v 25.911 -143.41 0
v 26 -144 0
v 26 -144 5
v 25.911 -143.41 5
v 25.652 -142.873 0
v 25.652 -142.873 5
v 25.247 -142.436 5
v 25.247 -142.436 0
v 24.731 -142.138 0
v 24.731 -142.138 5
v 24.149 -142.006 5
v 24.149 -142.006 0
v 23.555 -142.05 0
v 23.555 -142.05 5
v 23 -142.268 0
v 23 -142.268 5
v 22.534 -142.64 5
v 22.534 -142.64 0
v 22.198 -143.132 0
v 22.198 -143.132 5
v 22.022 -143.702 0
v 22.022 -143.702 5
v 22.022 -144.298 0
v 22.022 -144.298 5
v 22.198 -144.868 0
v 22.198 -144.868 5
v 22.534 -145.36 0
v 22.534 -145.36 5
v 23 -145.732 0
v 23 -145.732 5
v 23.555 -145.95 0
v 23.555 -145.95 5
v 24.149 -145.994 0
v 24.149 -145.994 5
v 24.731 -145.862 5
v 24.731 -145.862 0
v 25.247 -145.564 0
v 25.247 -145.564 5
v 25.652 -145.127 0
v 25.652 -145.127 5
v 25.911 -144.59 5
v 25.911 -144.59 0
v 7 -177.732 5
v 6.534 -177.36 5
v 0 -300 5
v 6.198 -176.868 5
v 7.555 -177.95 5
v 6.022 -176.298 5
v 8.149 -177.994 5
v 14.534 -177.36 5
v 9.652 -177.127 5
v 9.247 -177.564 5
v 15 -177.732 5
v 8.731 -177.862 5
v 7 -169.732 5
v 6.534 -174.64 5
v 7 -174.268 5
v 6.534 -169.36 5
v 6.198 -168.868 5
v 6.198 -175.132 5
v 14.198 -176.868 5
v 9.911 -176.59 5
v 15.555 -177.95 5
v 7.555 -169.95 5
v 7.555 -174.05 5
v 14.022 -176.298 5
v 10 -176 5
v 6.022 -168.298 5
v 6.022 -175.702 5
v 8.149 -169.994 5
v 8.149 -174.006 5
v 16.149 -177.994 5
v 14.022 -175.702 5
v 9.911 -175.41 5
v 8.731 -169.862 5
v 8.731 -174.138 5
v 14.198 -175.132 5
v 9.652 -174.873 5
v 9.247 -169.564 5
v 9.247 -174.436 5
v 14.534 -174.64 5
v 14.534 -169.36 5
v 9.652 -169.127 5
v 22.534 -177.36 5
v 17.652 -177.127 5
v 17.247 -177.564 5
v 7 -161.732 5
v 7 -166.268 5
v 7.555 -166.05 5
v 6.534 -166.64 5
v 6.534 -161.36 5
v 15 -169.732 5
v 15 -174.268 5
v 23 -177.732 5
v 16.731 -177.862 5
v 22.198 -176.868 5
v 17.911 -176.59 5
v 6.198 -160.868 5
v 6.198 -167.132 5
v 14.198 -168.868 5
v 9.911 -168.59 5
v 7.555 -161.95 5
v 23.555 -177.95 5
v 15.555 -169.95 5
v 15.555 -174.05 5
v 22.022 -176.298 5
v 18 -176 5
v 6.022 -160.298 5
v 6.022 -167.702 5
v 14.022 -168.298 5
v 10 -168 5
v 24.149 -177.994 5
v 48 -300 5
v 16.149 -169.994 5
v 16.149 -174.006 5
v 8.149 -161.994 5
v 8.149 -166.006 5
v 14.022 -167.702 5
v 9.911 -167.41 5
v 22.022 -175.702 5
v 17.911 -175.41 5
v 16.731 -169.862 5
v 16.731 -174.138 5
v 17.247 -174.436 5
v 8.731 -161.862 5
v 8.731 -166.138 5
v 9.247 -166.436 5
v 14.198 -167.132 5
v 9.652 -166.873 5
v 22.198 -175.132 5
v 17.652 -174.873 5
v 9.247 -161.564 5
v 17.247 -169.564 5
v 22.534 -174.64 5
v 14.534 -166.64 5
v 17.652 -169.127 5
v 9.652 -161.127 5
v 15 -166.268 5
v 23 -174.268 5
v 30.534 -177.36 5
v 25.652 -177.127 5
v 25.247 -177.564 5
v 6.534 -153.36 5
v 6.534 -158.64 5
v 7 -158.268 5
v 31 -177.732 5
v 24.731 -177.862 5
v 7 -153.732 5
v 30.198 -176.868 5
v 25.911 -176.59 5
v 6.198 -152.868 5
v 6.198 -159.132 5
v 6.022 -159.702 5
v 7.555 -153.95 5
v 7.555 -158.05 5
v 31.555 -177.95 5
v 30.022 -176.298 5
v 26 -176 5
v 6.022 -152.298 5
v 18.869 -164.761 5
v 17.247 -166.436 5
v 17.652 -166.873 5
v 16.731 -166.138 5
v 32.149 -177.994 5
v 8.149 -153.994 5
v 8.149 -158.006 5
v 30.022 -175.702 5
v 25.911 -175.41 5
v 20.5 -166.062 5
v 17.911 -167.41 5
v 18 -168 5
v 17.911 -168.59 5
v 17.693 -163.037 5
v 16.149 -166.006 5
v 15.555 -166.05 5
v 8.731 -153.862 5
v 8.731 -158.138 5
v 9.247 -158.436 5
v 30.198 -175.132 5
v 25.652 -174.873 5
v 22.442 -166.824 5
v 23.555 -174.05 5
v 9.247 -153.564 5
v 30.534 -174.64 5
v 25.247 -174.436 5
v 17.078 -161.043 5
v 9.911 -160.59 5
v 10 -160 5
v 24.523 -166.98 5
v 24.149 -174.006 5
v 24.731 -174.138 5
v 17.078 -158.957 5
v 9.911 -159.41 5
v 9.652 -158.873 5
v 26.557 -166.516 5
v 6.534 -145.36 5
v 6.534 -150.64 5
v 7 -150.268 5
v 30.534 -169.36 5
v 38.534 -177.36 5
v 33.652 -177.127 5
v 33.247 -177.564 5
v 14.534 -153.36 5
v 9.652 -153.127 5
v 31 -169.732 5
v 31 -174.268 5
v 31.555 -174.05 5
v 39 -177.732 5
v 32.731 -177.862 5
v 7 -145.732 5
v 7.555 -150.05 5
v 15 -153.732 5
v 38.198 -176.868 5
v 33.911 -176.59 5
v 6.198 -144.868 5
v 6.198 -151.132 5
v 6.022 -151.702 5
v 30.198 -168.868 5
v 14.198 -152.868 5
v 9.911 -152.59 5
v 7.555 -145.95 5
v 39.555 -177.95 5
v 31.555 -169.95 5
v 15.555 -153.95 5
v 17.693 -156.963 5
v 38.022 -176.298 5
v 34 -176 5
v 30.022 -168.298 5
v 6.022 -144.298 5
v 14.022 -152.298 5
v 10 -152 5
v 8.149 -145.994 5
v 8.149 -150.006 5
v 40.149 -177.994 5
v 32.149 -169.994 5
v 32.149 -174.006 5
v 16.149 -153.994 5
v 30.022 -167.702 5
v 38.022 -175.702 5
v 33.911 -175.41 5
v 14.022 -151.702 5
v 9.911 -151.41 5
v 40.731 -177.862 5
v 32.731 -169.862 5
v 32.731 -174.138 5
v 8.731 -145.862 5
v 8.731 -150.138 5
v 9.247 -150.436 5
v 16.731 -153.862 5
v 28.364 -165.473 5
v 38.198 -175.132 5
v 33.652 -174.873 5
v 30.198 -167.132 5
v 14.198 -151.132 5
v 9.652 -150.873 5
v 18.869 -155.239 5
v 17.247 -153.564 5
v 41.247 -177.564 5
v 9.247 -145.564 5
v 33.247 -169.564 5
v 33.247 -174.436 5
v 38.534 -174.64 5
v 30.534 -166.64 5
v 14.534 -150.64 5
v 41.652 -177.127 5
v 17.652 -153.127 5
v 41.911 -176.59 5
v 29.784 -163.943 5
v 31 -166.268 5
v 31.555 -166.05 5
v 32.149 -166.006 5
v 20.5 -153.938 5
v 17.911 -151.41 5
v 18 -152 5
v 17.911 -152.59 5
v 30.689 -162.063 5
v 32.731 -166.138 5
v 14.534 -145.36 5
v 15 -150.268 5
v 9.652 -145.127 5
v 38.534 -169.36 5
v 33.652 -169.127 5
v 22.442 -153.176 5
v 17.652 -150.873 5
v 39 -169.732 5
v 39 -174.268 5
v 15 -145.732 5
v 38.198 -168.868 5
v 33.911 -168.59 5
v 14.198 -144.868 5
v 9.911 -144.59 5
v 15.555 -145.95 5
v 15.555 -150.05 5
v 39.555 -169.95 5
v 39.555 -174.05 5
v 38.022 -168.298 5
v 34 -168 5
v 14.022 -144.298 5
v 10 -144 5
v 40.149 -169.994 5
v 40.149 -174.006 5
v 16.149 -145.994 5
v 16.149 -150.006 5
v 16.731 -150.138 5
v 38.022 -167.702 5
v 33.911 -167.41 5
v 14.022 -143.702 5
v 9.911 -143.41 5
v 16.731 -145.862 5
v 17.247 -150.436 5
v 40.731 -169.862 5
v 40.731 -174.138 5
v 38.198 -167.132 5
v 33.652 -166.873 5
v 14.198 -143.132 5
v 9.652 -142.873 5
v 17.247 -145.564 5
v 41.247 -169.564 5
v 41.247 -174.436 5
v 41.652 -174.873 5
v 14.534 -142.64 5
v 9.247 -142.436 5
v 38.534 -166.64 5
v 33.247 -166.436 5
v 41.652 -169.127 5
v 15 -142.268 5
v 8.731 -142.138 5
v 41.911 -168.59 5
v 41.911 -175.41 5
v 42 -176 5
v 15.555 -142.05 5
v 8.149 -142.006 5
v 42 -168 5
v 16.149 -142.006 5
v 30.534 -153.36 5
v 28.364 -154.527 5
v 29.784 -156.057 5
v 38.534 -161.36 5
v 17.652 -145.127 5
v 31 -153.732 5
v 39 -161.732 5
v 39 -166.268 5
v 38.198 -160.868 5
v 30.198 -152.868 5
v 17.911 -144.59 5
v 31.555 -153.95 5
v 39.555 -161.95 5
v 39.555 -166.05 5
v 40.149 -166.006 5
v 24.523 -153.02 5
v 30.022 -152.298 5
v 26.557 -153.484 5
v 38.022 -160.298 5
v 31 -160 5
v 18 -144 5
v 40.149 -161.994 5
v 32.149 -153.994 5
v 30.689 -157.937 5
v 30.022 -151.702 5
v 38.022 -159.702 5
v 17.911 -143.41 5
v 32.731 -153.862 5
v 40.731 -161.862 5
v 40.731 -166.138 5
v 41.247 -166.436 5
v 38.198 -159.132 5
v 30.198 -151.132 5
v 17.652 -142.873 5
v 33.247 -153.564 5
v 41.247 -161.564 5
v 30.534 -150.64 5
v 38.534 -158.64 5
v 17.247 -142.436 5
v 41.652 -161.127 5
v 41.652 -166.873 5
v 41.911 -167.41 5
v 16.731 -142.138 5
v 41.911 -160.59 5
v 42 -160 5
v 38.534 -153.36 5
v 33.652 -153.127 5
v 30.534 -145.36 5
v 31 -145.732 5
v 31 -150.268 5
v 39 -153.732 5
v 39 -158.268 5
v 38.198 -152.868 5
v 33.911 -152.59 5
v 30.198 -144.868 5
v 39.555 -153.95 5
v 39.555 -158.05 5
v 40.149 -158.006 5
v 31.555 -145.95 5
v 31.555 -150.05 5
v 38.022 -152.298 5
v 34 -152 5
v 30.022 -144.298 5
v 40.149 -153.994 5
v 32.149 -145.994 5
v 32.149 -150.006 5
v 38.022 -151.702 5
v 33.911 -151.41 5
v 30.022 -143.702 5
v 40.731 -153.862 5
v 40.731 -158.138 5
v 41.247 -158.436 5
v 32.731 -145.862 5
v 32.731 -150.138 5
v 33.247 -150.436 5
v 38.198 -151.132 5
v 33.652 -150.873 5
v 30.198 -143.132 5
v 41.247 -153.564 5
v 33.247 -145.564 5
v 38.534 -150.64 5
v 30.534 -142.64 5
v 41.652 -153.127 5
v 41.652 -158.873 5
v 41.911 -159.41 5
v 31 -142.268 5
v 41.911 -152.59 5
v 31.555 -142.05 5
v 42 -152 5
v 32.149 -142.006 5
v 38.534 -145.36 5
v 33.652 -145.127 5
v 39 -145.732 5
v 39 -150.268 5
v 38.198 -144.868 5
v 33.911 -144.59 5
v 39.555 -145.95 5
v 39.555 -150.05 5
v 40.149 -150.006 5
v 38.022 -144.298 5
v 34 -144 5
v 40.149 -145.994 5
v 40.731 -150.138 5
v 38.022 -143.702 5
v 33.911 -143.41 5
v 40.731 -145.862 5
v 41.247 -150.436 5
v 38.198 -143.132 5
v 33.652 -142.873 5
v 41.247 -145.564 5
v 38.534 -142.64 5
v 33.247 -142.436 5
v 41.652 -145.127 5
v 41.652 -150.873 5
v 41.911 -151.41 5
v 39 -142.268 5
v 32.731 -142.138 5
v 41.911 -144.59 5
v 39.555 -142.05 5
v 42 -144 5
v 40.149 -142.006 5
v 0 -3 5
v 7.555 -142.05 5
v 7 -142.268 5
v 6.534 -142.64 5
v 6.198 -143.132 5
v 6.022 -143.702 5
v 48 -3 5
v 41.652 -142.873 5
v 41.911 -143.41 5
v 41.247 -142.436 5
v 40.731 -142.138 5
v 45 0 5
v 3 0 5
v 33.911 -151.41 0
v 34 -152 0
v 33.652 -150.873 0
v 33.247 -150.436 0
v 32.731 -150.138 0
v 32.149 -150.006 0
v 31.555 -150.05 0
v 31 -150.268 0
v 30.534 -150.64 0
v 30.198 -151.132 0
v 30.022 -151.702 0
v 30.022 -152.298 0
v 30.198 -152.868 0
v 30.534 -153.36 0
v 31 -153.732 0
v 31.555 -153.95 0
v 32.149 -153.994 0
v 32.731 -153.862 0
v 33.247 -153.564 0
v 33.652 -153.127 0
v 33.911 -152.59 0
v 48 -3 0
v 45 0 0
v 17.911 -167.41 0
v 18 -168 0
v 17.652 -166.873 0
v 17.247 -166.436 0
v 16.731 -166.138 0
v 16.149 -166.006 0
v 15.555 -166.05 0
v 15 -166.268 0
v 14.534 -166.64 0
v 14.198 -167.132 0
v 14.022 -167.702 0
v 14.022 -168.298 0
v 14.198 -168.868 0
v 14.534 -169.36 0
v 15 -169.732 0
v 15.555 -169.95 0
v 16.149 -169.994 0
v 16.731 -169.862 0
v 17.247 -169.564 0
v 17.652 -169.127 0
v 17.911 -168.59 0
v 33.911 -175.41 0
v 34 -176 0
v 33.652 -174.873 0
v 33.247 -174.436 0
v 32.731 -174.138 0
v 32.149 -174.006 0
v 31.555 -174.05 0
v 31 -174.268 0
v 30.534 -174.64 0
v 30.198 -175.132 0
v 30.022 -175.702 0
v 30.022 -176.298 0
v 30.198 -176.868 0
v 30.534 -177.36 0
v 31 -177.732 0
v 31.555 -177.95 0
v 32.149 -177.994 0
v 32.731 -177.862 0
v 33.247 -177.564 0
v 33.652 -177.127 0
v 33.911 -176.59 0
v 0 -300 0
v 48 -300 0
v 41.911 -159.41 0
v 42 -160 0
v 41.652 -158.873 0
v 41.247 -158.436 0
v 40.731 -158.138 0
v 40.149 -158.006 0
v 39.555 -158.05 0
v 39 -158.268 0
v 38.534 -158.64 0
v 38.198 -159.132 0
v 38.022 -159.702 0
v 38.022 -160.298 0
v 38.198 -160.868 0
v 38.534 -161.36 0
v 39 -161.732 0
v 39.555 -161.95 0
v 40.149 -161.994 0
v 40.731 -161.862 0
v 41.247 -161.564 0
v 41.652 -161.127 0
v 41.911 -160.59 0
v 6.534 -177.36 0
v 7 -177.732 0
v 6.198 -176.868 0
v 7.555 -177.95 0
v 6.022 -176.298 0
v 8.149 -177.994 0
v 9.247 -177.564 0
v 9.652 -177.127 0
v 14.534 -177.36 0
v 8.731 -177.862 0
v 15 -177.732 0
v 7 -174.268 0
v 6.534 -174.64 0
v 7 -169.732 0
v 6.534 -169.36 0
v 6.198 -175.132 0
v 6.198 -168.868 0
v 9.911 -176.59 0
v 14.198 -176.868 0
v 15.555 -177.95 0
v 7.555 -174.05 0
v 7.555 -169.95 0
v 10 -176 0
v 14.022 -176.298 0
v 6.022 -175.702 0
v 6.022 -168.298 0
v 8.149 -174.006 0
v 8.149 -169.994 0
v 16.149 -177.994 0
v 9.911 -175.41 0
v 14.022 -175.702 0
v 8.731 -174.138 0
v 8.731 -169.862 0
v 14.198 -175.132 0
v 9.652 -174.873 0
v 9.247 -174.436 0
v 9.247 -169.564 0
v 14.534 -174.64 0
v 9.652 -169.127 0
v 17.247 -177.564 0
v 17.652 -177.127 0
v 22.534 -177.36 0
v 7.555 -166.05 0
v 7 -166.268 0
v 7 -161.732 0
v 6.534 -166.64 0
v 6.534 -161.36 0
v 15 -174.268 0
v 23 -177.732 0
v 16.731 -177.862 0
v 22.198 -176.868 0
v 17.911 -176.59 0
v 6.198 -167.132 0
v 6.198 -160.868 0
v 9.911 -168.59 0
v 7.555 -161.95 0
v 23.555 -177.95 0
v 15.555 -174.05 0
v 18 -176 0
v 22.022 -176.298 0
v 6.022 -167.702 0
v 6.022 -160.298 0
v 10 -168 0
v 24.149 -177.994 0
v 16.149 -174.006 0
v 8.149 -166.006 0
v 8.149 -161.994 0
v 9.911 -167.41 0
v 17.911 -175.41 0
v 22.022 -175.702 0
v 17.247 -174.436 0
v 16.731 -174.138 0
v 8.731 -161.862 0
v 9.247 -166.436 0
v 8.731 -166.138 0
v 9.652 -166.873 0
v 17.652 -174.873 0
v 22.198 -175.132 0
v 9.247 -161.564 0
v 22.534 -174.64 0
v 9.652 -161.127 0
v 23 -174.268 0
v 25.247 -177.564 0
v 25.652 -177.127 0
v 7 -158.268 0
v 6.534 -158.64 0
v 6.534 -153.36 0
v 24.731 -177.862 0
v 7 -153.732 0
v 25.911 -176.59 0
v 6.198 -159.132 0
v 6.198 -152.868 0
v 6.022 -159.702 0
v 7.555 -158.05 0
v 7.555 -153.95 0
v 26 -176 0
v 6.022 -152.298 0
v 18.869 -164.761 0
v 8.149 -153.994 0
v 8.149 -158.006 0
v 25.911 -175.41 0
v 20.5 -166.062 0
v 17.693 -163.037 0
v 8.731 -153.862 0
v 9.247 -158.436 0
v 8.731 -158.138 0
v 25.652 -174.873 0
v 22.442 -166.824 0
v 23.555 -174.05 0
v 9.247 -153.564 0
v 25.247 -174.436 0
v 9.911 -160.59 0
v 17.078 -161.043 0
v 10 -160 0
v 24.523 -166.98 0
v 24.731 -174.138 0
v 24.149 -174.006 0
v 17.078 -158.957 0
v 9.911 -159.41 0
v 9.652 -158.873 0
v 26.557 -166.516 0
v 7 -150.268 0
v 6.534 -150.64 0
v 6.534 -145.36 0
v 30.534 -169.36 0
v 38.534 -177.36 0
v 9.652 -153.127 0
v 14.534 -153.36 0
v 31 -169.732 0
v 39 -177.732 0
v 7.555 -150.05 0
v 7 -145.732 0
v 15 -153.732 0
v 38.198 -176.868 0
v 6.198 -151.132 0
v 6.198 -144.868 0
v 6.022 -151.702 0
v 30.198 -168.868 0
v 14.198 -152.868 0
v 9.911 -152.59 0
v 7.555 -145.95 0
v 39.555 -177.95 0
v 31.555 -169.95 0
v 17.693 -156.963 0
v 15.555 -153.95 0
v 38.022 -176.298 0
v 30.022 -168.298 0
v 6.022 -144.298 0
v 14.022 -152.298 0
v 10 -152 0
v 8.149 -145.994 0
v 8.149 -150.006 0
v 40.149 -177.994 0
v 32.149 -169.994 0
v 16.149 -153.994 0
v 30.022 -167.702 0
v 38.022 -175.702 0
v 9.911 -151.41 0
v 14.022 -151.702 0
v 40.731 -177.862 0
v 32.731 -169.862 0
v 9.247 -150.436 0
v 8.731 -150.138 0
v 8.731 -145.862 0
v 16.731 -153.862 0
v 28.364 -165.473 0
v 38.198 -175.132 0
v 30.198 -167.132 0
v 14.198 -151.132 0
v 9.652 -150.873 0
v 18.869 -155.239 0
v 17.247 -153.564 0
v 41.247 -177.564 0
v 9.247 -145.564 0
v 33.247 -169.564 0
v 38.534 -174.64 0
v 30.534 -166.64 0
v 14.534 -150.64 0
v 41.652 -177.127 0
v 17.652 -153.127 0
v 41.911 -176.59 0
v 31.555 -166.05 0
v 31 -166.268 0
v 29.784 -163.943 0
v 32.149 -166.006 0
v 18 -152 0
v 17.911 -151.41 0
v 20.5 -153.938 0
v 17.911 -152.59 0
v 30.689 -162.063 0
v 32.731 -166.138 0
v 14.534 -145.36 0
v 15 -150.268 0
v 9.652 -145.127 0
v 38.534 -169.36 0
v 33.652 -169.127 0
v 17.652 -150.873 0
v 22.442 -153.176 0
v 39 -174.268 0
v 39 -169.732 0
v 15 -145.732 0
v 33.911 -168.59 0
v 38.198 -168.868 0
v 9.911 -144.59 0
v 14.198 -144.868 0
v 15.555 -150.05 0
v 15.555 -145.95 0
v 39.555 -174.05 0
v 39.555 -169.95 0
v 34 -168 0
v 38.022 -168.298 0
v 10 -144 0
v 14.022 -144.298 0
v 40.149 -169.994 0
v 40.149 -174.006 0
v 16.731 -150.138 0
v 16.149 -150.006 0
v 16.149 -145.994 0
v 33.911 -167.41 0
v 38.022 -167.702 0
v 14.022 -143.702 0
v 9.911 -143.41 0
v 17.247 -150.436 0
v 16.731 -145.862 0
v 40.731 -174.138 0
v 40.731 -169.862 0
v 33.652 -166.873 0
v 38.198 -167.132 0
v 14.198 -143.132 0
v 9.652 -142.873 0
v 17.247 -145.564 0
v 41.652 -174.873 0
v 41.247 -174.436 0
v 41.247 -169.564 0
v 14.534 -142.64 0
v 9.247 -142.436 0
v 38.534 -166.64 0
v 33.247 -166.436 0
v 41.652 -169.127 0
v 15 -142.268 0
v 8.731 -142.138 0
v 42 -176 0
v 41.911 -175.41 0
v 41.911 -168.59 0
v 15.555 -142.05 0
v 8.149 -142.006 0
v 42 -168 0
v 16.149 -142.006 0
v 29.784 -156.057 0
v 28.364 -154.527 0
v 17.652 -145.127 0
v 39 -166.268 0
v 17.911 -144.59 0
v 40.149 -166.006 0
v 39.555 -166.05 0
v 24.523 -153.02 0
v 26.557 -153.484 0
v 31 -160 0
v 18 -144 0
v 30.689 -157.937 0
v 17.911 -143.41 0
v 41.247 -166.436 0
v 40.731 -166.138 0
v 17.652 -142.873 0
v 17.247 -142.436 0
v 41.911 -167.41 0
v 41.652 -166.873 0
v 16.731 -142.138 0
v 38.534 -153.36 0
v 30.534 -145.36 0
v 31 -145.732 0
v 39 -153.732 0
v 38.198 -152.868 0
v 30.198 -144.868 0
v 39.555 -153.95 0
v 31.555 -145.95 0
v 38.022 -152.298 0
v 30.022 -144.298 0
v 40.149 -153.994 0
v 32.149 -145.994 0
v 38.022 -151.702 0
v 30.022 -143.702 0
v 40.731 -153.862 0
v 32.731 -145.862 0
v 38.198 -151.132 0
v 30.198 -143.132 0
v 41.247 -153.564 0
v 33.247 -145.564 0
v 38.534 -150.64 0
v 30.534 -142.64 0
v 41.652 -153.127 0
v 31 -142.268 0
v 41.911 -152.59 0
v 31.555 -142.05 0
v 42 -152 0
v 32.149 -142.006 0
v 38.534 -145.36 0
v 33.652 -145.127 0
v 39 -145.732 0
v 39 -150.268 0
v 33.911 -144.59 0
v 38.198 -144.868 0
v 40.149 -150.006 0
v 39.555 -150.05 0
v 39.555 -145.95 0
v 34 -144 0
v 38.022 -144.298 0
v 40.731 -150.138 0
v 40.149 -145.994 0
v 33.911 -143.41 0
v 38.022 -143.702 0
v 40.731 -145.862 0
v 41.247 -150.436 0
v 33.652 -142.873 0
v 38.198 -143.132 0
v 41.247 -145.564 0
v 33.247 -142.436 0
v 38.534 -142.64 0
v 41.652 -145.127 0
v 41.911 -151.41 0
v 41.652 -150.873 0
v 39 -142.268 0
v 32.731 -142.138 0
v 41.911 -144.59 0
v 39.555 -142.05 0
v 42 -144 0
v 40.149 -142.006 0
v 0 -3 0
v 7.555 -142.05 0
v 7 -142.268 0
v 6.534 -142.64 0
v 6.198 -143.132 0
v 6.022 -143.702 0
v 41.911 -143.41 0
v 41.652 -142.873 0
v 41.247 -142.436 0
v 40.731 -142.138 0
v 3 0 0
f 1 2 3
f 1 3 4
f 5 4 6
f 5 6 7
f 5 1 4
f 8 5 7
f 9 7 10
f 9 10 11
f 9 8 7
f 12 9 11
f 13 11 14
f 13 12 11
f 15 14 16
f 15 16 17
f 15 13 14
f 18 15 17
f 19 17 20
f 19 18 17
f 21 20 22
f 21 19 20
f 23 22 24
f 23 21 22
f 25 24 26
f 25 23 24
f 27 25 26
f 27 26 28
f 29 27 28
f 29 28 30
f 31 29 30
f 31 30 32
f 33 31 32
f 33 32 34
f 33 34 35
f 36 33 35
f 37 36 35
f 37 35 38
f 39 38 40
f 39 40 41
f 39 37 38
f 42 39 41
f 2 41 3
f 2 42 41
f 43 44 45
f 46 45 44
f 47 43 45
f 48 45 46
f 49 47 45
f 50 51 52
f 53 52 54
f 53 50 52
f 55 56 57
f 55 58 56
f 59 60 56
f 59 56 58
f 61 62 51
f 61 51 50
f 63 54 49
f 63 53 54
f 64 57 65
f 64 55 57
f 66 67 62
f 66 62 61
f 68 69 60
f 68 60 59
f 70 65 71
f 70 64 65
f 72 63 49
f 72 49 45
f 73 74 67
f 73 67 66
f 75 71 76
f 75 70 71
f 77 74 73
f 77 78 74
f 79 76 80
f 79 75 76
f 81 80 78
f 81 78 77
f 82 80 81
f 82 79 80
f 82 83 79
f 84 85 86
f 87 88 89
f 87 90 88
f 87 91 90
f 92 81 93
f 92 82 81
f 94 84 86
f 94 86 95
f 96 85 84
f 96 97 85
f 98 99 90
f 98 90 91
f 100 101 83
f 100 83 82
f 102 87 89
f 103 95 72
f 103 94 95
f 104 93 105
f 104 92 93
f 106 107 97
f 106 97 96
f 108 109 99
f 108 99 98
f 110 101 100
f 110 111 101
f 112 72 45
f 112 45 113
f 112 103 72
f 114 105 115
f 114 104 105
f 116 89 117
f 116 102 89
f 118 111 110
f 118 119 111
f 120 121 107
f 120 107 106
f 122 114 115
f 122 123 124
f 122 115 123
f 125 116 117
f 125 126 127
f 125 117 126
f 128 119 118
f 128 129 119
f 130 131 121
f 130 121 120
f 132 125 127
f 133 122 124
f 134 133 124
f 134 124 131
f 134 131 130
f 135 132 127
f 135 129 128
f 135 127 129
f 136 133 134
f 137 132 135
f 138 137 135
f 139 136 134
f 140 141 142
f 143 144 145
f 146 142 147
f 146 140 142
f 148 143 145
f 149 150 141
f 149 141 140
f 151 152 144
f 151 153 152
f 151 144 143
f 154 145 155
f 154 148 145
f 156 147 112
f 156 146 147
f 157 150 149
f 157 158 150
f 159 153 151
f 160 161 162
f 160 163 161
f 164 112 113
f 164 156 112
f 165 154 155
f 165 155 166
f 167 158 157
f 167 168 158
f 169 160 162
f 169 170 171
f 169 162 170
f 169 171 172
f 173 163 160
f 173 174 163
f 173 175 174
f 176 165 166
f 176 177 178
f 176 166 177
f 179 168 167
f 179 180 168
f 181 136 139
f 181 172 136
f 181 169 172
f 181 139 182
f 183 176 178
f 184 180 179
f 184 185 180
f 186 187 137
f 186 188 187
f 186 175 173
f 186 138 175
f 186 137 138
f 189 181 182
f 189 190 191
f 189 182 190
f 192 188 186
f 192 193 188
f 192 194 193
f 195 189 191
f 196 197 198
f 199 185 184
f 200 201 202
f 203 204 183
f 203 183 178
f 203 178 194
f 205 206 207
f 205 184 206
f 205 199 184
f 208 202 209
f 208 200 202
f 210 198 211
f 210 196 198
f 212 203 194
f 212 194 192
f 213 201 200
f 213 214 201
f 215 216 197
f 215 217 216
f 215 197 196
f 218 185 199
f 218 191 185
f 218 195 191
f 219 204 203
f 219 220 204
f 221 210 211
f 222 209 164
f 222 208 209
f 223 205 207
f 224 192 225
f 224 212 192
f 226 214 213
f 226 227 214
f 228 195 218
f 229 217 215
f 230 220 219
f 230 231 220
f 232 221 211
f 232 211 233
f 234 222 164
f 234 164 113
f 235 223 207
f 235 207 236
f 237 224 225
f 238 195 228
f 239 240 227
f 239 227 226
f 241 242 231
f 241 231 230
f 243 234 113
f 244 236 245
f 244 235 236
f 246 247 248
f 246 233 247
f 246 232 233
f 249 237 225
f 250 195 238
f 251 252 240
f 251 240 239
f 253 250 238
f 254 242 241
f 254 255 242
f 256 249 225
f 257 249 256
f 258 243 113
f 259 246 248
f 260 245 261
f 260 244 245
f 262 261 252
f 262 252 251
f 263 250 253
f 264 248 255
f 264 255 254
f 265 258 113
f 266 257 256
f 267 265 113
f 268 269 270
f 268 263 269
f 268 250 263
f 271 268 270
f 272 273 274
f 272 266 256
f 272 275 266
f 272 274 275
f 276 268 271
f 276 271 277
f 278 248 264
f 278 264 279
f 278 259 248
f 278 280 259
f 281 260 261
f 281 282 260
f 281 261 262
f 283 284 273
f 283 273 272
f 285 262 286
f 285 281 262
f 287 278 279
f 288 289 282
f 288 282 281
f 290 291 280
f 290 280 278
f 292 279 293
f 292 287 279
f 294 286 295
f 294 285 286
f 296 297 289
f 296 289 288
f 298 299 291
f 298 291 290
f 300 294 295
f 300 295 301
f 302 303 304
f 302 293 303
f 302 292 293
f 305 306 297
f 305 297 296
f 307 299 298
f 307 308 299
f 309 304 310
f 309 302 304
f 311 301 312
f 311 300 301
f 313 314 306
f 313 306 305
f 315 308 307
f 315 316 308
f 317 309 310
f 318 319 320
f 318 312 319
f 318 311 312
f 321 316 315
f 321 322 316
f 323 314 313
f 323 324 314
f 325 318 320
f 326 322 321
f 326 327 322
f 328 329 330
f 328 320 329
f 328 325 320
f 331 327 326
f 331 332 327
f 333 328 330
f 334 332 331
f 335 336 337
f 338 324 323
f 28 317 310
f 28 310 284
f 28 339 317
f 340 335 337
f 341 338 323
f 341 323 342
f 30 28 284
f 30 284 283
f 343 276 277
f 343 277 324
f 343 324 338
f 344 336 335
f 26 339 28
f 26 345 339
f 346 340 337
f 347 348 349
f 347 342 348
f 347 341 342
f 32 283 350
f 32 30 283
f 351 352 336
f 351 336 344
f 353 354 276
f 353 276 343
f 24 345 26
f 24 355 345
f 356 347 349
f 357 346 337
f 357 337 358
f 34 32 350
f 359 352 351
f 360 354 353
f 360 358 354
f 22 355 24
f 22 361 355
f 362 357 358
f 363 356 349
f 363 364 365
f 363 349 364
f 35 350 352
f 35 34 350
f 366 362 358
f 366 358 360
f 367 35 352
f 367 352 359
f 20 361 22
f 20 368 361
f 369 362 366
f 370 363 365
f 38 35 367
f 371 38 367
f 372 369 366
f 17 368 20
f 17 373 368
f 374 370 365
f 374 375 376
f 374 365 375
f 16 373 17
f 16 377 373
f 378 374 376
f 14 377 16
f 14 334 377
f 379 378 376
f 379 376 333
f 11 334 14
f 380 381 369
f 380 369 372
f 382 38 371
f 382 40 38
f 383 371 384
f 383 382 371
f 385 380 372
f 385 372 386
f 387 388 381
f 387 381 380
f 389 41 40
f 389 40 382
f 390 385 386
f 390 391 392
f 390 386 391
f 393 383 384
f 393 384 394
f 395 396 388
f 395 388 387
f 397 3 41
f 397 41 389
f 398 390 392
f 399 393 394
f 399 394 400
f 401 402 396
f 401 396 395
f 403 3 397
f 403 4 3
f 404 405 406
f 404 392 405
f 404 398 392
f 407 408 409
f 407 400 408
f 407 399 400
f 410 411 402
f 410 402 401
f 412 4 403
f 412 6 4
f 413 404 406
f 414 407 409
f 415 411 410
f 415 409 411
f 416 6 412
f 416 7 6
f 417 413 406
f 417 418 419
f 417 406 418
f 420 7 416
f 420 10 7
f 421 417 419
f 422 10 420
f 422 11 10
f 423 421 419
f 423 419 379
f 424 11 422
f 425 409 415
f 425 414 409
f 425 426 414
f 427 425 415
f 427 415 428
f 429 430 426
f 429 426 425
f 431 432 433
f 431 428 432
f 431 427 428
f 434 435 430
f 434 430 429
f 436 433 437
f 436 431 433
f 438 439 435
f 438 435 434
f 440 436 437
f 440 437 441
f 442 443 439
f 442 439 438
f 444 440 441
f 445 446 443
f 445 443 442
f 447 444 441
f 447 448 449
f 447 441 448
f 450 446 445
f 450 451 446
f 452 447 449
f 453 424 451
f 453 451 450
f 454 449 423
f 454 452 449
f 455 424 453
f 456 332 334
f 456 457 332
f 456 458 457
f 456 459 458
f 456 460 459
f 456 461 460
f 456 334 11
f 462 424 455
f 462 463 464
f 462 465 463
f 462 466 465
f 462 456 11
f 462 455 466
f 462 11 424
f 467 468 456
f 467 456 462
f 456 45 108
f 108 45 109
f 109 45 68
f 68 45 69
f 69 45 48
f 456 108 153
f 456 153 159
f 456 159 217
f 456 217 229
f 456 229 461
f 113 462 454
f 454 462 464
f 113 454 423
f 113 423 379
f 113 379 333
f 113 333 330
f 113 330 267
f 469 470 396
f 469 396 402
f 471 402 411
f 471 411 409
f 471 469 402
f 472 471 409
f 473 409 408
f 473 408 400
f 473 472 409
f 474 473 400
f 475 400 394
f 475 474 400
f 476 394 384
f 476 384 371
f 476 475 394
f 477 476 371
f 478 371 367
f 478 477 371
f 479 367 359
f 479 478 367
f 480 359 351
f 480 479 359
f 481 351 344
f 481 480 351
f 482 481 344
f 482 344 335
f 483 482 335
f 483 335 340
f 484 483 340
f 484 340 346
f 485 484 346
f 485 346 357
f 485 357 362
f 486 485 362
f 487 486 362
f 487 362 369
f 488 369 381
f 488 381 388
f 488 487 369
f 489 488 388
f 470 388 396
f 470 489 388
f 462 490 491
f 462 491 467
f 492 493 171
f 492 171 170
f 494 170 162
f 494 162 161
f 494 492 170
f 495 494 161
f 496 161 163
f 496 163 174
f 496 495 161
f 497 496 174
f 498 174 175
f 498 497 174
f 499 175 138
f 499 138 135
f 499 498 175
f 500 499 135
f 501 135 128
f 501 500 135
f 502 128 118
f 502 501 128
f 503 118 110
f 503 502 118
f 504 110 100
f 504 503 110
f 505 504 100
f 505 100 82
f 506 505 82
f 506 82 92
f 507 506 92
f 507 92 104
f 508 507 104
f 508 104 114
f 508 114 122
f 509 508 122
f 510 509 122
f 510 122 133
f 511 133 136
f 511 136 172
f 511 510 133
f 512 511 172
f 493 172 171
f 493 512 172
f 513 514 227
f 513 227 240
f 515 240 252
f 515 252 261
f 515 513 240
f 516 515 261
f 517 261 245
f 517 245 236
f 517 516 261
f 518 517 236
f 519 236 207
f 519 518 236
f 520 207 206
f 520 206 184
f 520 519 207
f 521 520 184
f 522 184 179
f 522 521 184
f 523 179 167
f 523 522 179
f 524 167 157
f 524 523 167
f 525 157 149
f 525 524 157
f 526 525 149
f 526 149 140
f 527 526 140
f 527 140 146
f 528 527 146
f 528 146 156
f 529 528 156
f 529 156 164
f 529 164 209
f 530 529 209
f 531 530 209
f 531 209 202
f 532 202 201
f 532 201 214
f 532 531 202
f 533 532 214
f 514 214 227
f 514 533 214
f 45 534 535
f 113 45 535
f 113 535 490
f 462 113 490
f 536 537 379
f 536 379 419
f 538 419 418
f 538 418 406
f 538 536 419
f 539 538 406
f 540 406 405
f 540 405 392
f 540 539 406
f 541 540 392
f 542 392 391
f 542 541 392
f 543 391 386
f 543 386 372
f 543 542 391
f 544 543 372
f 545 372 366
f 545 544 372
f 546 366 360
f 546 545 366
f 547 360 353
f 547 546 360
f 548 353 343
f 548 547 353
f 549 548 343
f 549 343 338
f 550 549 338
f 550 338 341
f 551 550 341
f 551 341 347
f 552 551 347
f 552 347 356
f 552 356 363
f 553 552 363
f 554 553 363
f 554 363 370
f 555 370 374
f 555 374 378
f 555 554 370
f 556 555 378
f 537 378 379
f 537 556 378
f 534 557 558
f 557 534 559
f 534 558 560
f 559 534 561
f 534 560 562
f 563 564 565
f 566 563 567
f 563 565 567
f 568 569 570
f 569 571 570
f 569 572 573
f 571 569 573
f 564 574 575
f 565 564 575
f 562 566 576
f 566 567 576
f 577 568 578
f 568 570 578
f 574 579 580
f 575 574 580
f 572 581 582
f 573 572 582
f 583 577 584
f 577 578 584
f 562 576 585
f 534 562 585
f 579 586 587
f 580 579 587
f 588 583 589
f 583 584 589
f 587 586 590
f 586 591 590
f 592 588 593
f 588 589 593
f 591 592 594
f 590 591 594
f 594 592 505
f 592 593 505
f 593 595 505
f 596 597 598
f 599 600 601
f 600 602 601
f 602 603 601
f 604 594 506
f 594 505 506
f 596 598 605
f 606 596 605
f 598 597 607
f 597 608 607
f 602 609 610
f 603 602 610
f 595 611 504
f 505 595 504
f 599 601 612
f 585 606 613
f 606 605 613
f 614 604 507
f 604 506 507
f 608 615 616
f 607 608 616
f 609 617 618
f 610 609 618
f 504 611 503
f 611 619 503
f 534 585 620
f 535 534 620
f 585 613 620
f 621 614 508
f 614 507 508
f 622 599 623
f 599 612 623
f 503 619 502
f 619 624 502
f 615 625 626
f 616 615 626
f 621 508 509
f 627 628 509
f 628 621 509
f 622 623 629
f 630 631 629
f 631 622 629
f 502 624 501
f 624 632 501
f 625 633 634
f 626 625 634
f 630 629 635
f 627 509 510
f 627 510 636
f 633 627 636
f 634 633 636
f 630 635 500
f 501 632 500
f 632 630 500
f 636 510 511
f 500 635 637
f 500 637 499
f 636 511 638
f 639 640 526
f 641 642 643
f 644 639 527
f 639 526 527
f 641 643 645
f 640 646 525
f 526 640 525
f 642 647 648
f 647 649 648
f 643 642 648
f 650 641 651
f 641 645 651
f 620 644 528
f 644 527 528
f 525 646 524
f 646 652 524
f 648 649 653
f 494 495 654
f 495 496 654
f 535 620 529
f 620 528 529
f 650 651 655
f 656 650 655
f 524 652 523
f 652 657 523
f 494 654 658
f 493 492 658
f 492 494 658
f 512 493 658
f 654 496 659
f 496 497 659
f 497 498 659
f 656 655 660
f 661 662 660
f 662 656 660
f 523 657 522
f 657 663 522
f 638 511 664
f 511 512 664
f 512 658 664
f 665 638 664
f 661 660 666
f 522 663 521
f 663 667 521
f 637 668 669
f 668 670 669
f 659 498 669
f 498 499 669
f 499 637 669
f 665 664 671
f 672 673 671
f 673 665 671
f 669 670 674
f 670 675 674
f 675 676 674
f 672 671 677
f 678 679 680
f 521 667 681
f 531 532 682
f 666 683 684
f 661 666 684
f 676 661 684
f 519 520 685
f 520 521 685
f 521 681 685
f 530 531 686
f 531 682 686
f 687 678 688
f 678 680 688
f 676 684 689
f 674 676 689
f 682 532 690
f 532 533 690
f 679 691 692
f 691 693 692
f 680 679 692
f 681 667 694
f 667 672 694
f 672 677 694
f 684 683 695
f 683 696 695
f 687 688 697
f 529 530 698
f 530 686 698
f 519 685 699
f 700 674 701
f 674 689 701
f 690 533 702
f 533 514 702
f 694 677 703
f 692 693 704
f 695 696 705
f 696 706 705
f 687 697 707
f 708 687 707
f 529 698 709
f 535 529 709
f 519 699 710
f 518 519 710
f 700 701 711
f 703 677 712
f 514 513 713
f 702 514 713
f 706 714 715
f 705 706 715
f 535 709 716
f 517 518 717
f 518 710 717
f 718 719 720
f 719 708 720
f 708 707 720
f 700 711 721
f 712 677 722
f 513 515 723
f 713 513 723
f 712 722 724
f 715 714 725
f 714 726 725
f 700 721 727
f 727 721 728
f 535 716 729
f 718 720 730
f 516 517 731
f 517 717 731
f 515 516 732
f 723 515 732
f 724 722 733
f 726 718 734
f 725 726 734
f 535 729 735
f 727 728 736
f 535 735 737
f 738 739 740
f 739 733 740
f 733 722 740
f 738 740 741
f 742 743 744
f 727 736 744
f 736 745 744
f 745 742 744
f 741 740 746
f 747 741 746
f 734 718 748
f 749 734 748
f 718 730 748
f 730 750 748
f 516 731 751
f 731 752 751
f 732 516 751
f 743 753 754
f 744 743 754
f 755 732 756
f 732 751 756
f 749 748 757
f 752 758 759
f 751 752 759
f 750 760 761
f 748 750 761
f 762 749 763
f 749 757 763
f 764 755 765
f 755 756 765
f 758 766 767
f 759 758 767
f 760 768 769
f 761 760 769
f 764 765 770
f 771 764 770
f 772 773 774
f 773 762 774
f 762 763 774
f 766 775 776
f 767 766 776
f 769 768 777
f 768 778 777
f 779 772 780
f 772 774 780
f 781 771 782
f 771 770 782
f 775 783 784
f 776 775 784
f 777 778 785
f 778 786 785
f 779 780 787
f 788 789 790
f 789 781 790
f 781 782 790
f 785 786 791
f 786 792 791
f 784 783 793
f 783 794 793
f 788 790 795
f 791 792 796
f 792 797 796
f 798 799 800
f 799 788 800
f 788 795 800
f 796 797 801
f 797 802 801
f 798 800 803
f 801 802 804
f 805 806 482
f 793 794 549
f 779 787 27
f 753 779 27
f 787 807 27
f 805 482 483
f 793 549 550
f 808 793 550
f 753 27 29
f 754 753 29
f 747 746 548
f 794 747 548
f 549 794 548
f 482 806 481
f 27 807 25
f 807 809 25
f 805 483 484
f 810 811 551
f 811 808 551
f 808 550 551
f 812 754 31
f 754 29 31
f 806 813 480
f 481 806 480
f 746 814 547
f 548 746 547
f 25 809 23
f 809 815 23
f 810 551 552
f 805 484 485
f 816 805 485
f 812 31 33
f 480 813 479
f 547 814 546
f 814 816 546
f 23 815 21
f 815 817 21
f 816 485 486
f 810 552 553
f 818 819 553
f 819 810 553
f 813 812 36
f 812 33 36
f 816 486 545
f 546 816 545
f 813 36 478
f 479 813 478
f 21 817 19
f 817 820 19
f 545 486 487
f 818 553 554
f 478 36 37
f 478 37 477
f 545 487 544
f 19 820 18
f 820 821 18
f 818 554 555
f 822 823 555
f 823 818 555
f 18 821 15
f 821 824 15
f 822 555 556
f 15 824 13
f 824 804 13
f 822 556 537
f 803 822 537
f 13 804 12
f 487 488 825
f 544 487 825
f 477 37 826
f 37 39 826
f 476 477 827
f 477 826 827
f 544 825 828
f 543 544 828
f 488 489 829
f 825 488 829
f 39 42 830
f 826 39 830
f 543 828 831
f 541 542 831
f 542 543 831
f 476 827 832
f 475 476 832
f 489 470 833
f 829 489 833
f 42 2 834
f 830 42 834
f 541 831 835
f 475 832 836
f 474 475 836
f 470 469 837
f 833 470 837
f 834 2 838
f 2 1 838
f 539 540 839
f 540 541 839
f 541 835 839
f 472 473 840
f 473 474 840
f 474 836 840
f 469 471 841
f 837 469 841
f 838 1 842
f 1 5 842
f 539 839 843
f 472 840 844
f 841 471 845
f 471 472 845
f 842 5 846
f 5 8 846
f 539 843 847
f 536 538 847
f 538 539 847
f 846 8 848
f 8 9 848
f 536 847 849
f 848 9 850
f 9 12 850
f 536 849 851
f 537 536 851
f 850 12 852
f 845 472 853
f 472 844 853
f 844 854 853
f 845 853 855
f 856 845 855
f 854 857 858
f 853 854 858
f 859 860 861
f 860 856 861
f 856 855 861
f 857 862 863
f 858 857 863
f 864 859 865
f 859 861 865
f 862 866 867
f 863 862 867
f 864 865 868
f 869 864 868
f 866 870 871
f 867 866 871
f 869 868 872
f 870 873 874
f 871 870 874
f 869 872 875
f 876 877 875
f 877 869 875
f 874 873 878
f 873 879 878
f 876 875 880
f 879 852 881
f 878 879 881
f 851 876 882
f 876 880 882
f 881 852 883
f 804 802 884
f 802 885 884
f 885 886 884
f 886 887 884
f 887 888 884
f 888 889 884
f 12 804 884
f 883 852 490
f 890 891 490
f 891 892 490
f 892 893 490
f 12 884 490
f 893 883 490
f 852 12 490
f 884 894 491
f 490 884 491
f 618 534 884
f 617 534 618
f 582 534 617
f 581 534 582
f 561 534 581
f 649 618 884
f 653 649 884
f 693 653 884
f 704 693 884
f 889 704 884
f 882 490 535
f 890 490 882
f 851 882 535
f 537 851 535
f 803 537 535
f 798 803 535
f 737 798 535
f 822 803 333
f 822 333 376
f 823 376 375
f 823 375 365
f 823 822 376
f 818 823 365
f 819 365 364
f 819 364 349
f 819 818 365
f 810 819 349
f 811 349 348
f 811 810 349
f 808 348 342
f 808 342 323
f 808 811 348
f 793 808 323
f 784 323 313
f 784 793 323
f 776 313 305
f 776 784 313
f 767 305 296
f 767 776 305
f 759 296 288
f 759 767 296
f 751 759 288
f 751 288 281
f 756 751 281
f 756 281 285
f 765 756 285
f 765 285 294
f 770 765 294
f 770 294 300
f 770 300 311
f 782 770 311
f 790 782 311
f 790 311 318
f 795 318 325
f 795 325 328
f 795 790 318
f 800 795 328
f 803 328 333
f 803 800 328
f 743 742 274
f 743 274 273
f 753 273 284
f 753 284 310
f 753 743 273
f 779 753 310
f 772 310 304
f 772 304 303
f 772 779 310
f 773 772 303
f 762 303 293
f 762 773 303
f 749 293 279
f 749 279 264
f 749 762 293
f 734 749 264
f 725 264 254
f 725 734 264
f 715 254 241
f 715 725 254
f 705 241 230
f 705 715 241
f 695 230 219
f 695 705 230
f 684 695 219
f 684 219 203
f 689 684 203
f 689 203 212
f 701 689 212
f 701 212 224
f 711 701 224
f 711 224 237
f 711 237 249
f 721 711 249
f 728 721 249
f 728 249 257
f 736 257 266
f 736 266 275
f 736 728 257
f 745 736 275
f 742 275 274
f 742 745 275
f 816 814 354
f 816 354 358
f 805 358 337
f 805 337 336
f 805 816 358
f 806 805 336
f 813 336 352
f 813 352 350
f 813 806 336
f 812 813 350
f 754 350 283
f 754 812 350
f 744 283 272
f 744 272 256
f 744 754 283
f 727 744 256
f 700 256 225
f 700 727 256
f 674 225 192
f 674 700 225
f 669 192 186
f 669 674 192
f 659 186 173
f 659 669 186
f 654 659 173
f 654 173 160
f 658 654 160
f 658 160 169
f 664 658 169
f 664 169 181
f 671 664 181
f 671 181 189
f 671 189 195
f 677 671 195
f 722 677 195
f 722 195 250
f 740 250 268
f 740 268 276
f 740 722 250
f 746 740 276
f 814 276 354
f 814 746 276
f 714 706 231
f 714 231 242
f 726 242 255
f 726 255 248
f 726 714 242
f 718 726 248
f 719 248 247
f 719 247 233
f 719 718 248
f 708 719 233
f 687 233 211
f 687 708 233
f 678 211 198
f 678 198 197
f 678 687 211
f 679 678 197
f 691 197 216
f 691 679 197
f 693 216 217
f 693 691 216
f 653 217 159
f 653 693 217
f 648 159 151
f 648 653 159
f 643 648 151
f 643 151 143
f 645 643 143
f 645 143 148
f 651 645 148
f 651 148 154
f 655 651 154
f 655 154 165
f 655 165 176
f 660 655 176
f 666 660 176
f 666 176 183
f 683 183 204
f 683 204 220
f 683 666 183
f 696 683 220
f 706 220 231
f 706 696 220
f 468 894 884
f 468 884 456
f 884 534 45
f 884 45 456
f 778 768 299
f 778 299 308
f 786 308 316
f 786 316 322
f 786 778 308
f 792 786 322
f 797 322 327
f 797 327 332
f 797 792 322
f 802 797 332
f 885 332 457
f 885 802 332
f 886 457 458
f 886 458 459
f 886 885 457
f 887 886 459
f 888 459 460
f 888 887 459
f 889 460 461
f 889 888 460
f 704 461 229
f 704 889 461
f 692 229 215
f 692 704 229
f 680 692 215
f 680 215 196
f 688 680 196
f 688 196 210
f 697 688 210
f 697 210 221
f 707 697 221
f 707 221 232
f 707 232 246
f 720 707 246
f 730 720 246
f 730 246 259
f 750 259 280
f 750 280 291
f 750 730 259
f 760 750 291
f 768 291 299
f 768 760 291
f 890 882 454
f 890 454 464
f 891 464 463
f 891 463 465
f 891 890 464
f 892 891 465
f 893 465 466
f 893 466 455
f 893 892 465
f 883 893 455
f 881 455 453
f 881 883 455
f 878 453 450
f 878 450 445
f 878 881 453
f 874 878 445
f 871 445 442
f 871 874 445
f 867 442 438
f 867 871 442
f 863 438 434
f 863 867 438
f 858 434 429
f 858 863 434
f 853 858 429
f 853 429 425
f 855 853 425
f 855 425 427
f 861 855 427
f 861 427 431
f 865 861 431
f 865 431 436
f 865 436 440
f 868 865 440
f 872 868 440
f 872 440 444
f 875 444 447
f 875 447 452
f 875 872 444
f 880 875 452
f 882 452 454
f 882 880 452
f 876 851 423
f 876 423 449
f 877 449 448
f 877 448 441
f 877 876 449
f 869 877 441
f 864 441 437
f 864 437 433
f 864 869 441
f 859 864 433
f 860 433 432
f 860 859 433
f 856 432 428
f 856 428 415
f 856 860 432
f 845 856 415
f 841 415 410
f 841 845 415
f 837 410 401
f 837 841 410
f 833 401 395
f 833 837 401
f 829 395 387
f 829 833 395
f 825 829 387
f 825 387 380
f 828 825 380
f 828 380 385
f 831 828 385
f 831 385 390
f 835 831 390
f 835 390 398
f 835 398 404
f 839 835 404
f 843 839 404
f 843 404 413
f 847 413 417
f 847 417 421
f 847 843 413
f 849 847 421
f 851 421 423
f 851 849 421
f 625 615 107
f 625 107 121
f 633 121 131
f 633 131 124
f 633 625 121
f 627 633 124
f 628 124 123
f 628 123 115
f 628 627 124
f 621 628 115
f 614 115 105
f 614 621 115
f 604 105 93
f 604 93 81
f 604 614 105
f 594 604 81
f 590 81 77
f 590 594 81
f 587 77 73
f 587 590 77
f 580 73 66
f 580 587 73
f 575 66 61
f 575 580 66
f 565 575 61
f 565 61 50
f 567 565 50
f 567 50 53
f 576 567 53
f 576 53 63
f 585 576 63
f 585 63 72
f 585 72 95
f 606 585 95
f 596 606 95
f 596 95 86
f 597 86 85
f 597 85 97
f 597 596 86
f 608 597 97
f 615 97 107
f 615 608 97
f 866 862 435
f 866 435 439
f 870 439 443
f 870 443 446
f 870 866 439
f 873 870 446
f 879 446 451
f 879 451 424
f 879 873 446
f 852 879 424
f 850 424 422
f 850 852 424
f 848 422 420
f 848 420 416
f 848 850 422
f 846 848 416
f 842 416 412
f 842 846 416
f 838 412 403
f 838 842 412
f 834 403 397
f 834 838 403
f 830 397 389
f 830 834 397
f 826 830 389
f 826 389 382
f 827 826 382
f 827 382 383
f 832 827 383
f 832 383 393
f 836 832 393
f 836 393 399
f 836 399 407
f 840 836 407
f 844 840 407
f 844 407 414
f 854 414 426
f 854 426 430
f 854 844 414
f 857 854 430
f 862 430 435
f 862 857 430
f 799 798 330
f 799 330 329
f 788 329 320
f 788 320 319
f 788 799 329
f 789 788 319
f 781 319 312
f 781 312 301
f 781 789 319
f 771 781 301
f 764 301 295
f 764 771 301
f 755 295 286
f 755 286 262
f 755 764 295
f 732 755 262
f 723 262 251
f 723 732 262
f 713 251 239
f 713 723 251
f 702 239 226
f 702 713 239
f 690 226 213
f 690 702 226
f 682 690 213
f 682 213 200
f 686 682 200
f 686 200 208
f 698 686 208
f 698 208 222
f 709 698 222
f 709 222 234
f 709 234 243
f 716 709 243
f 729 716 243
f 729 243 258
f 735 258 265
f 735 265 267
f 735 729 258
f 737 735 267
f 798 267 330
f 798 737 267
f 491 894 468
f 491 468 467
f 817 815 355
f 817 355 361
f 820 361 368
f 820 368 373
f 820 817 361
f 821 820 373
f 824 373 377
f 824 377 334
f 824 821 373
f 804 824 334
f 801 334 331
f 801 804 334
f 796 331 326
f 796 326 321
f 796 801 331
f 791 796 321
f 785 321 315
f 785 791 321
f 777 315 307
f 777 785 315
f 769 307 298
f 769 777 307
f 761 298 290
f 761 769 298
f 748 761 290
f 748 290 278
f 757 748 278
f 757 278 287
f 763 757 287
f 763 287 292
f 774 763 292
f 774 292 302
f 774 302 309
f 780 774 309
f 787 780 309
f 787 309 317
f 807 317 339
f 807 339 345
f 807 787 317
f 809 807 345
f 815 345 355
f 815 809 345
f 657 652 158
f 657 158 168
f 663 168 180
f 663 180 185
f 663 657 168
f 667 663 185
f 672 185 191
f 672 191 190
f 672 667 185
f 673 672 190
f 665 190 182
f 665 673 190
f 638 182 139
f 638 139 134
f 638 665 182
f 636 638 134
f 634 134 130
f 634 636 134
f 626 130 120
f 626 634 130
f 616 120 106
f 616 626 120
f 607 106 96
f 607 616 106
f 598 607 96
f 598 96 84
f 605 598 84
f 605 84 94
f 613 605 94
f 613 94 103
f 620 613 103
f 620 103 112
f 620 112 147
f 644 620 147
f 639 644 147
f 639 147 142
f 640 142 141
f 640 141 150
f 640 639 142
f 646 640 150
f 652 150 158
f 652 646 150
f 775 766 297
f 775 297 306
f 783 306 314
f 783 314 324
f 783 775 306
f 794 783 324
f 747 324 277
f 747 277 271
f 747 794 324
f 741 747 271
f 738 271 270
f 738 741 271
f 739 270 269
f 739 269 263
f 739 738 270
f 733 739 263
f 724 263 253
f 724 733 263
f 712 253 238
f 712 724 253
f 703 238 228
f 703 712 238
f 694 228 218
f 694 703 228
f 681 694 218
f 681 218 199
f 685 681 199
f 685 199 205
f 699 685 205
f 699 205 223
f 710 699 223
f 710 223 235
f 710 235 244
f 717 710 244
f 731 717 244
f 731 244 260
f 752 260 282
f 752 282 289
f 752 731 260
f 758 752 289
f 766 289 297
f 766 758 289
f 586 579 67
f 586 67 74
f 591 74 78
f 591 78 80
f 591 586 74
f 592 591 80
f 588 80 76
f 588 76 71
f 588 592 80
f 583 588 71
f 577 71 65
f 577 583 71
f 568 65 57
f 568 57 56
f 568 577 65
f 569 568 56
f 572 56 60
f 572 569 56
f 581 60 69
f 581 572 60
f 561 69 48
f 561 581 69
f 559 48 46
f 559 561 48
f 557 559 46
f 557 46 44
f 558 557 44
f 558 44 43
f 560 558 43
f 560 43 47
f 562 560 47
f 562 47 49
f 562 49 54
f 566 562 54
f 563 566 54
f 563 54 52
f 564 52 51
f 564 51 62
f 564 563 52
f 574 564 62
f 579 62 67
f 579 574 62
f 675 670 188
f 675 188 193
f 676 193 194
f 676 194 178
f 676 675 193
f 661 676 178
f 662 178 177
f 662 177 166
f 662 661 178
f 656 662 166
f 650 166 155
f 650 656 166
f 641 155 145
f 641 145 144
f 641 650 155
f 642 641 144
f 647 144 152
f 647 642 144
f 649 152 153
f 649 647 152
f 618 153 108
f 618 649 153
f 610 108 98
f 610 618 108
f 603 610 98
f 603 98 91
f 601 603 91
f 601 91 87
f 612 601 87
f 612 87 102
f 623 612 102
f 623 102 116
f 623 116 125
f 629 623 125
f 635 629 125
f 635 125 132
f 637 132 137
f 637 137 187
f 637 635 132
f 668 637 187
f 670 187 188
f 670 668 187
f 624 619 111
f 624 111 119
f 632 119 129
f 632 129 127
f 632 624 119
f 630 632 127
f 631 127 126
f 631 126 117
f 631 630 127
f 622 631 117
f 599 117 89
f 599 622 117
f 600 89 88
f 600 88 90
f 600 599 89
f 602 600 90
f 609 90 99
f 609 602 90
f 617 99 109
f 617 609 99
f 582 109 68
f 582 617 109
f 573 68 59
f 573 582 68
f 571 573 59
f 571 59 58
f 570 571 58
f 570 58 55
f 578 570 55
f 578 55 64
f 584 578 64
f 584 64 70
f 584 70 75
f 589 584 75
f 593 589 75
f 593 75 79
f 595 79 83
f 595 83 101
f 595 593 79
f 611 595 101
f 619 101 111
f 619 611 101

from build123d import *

# Parameters (mm, degrees)
SKETCH1_W           = 48
SKETCH1_H           = 300
SKETCH1_R           = 7
SKETCH1_R_2         = 2
BOSS_EXTRUDE1_DEPTH = 5
CHAMFER1_SIZE       = 3


with BuildPart() as part:
    # Sketch1 → Boss-Extrude1 (new body)
    with BuildSketch(Plane.XY):
        with Locations((24, -150)):
            Rectangle(SKETCH1_W, SKETCH1_H)
        with Locations((24, -160)):
            Circle(SKETCH1_R, mode=Mode.SUBTRACT)
        with Locations((8, -144)):
            Circle(SKETCH1_R_2, mode=Mode.SUBTRACT)
        with Locations((16, -144)):
            Circle(SKETCH1_R_2, mode=Mode.SUBTRACT)
        with Locations((24, -144)):
            Circle(SKETCH1_R_2, mode=Mode.SUBTRACT)
        with Locations((32, -144)):
            Circle(SKETCH1_R_2, mode=Mode.SUBTRACT)
        with Locations((40, -144)):
            Circle(SKETCH1_R_2, mode=Mode.SUBTRACT)
        with Locations((16, -152)):
            Circle(SKETCH1_R_2, mode=Mode.SUBTRACT)
        with Locations((32, -152)):
            Circle(SKETCH1_R_2, mode=Mode.SUBTRACT)
        with Locations((40, -152)):
            Circle(SKETCH1_R_2, mode=Mode.SUBTRACT)
        with Locations((40, -160)):
            Circle(SKETCH1_R_2, mode=Mode.SUBTRACT)
        with Locations((16, -168)):
            Circle(SKETCH1_R_2, mode=Mode.SUBTRACT)
        with Locations((32, -168)):
            Circle(SKETCH1_R_2, mode=Mode.SUBTRACT)
        with Locations((40, -168)):
            Circle(SKETCH1_R_2, mode=Mode.SUBTRACT)
        with Locations((16, -176)):
            Circle(SKETCH1_R_2, mode=Mode.SUBTRACT)
        with Locations((24, -176)):
            Circle(SKETCH1_R_2, mode=Mode.SUBTRACT)
        with Locations((32, -176)):
            Circle(SKETCH1_R_2, mode=Mode.SUBTRACT)
        with Locations((40, -176)):
            Circle(SKETCH1_R_2, mode=Mode.SUBTRACT)
        with Locations((8, -152)):
            Circle(SKETCH1_R_2, mode=Mode.SUBTRACT)
        with Locations((8, -160)):
            Circle(SKETCH1_R_2, mode=Mode.SUBTRACT)
        with Locations((8, -168)):
            Circle(SKETCH1_R_2, mode=Mode.SUBTRACT)
        with Locations((8, -176)):
            Circle(SKETCH1_R_2, mode=Mode.SUBTRACT)
    extrude(amount=BOSS_EXTRUDE1_DEPTH)

    # Chamfer1
    chamfer1_edges = [part.edges().sort_by_distance(p)[0] for p in [
        (48, 0, 2.5),
        (0, 0, 2.5),
    ]]
    chamfer(chamfer1_edges, length=CHAMFER1_SIZE)


solid = part.part
